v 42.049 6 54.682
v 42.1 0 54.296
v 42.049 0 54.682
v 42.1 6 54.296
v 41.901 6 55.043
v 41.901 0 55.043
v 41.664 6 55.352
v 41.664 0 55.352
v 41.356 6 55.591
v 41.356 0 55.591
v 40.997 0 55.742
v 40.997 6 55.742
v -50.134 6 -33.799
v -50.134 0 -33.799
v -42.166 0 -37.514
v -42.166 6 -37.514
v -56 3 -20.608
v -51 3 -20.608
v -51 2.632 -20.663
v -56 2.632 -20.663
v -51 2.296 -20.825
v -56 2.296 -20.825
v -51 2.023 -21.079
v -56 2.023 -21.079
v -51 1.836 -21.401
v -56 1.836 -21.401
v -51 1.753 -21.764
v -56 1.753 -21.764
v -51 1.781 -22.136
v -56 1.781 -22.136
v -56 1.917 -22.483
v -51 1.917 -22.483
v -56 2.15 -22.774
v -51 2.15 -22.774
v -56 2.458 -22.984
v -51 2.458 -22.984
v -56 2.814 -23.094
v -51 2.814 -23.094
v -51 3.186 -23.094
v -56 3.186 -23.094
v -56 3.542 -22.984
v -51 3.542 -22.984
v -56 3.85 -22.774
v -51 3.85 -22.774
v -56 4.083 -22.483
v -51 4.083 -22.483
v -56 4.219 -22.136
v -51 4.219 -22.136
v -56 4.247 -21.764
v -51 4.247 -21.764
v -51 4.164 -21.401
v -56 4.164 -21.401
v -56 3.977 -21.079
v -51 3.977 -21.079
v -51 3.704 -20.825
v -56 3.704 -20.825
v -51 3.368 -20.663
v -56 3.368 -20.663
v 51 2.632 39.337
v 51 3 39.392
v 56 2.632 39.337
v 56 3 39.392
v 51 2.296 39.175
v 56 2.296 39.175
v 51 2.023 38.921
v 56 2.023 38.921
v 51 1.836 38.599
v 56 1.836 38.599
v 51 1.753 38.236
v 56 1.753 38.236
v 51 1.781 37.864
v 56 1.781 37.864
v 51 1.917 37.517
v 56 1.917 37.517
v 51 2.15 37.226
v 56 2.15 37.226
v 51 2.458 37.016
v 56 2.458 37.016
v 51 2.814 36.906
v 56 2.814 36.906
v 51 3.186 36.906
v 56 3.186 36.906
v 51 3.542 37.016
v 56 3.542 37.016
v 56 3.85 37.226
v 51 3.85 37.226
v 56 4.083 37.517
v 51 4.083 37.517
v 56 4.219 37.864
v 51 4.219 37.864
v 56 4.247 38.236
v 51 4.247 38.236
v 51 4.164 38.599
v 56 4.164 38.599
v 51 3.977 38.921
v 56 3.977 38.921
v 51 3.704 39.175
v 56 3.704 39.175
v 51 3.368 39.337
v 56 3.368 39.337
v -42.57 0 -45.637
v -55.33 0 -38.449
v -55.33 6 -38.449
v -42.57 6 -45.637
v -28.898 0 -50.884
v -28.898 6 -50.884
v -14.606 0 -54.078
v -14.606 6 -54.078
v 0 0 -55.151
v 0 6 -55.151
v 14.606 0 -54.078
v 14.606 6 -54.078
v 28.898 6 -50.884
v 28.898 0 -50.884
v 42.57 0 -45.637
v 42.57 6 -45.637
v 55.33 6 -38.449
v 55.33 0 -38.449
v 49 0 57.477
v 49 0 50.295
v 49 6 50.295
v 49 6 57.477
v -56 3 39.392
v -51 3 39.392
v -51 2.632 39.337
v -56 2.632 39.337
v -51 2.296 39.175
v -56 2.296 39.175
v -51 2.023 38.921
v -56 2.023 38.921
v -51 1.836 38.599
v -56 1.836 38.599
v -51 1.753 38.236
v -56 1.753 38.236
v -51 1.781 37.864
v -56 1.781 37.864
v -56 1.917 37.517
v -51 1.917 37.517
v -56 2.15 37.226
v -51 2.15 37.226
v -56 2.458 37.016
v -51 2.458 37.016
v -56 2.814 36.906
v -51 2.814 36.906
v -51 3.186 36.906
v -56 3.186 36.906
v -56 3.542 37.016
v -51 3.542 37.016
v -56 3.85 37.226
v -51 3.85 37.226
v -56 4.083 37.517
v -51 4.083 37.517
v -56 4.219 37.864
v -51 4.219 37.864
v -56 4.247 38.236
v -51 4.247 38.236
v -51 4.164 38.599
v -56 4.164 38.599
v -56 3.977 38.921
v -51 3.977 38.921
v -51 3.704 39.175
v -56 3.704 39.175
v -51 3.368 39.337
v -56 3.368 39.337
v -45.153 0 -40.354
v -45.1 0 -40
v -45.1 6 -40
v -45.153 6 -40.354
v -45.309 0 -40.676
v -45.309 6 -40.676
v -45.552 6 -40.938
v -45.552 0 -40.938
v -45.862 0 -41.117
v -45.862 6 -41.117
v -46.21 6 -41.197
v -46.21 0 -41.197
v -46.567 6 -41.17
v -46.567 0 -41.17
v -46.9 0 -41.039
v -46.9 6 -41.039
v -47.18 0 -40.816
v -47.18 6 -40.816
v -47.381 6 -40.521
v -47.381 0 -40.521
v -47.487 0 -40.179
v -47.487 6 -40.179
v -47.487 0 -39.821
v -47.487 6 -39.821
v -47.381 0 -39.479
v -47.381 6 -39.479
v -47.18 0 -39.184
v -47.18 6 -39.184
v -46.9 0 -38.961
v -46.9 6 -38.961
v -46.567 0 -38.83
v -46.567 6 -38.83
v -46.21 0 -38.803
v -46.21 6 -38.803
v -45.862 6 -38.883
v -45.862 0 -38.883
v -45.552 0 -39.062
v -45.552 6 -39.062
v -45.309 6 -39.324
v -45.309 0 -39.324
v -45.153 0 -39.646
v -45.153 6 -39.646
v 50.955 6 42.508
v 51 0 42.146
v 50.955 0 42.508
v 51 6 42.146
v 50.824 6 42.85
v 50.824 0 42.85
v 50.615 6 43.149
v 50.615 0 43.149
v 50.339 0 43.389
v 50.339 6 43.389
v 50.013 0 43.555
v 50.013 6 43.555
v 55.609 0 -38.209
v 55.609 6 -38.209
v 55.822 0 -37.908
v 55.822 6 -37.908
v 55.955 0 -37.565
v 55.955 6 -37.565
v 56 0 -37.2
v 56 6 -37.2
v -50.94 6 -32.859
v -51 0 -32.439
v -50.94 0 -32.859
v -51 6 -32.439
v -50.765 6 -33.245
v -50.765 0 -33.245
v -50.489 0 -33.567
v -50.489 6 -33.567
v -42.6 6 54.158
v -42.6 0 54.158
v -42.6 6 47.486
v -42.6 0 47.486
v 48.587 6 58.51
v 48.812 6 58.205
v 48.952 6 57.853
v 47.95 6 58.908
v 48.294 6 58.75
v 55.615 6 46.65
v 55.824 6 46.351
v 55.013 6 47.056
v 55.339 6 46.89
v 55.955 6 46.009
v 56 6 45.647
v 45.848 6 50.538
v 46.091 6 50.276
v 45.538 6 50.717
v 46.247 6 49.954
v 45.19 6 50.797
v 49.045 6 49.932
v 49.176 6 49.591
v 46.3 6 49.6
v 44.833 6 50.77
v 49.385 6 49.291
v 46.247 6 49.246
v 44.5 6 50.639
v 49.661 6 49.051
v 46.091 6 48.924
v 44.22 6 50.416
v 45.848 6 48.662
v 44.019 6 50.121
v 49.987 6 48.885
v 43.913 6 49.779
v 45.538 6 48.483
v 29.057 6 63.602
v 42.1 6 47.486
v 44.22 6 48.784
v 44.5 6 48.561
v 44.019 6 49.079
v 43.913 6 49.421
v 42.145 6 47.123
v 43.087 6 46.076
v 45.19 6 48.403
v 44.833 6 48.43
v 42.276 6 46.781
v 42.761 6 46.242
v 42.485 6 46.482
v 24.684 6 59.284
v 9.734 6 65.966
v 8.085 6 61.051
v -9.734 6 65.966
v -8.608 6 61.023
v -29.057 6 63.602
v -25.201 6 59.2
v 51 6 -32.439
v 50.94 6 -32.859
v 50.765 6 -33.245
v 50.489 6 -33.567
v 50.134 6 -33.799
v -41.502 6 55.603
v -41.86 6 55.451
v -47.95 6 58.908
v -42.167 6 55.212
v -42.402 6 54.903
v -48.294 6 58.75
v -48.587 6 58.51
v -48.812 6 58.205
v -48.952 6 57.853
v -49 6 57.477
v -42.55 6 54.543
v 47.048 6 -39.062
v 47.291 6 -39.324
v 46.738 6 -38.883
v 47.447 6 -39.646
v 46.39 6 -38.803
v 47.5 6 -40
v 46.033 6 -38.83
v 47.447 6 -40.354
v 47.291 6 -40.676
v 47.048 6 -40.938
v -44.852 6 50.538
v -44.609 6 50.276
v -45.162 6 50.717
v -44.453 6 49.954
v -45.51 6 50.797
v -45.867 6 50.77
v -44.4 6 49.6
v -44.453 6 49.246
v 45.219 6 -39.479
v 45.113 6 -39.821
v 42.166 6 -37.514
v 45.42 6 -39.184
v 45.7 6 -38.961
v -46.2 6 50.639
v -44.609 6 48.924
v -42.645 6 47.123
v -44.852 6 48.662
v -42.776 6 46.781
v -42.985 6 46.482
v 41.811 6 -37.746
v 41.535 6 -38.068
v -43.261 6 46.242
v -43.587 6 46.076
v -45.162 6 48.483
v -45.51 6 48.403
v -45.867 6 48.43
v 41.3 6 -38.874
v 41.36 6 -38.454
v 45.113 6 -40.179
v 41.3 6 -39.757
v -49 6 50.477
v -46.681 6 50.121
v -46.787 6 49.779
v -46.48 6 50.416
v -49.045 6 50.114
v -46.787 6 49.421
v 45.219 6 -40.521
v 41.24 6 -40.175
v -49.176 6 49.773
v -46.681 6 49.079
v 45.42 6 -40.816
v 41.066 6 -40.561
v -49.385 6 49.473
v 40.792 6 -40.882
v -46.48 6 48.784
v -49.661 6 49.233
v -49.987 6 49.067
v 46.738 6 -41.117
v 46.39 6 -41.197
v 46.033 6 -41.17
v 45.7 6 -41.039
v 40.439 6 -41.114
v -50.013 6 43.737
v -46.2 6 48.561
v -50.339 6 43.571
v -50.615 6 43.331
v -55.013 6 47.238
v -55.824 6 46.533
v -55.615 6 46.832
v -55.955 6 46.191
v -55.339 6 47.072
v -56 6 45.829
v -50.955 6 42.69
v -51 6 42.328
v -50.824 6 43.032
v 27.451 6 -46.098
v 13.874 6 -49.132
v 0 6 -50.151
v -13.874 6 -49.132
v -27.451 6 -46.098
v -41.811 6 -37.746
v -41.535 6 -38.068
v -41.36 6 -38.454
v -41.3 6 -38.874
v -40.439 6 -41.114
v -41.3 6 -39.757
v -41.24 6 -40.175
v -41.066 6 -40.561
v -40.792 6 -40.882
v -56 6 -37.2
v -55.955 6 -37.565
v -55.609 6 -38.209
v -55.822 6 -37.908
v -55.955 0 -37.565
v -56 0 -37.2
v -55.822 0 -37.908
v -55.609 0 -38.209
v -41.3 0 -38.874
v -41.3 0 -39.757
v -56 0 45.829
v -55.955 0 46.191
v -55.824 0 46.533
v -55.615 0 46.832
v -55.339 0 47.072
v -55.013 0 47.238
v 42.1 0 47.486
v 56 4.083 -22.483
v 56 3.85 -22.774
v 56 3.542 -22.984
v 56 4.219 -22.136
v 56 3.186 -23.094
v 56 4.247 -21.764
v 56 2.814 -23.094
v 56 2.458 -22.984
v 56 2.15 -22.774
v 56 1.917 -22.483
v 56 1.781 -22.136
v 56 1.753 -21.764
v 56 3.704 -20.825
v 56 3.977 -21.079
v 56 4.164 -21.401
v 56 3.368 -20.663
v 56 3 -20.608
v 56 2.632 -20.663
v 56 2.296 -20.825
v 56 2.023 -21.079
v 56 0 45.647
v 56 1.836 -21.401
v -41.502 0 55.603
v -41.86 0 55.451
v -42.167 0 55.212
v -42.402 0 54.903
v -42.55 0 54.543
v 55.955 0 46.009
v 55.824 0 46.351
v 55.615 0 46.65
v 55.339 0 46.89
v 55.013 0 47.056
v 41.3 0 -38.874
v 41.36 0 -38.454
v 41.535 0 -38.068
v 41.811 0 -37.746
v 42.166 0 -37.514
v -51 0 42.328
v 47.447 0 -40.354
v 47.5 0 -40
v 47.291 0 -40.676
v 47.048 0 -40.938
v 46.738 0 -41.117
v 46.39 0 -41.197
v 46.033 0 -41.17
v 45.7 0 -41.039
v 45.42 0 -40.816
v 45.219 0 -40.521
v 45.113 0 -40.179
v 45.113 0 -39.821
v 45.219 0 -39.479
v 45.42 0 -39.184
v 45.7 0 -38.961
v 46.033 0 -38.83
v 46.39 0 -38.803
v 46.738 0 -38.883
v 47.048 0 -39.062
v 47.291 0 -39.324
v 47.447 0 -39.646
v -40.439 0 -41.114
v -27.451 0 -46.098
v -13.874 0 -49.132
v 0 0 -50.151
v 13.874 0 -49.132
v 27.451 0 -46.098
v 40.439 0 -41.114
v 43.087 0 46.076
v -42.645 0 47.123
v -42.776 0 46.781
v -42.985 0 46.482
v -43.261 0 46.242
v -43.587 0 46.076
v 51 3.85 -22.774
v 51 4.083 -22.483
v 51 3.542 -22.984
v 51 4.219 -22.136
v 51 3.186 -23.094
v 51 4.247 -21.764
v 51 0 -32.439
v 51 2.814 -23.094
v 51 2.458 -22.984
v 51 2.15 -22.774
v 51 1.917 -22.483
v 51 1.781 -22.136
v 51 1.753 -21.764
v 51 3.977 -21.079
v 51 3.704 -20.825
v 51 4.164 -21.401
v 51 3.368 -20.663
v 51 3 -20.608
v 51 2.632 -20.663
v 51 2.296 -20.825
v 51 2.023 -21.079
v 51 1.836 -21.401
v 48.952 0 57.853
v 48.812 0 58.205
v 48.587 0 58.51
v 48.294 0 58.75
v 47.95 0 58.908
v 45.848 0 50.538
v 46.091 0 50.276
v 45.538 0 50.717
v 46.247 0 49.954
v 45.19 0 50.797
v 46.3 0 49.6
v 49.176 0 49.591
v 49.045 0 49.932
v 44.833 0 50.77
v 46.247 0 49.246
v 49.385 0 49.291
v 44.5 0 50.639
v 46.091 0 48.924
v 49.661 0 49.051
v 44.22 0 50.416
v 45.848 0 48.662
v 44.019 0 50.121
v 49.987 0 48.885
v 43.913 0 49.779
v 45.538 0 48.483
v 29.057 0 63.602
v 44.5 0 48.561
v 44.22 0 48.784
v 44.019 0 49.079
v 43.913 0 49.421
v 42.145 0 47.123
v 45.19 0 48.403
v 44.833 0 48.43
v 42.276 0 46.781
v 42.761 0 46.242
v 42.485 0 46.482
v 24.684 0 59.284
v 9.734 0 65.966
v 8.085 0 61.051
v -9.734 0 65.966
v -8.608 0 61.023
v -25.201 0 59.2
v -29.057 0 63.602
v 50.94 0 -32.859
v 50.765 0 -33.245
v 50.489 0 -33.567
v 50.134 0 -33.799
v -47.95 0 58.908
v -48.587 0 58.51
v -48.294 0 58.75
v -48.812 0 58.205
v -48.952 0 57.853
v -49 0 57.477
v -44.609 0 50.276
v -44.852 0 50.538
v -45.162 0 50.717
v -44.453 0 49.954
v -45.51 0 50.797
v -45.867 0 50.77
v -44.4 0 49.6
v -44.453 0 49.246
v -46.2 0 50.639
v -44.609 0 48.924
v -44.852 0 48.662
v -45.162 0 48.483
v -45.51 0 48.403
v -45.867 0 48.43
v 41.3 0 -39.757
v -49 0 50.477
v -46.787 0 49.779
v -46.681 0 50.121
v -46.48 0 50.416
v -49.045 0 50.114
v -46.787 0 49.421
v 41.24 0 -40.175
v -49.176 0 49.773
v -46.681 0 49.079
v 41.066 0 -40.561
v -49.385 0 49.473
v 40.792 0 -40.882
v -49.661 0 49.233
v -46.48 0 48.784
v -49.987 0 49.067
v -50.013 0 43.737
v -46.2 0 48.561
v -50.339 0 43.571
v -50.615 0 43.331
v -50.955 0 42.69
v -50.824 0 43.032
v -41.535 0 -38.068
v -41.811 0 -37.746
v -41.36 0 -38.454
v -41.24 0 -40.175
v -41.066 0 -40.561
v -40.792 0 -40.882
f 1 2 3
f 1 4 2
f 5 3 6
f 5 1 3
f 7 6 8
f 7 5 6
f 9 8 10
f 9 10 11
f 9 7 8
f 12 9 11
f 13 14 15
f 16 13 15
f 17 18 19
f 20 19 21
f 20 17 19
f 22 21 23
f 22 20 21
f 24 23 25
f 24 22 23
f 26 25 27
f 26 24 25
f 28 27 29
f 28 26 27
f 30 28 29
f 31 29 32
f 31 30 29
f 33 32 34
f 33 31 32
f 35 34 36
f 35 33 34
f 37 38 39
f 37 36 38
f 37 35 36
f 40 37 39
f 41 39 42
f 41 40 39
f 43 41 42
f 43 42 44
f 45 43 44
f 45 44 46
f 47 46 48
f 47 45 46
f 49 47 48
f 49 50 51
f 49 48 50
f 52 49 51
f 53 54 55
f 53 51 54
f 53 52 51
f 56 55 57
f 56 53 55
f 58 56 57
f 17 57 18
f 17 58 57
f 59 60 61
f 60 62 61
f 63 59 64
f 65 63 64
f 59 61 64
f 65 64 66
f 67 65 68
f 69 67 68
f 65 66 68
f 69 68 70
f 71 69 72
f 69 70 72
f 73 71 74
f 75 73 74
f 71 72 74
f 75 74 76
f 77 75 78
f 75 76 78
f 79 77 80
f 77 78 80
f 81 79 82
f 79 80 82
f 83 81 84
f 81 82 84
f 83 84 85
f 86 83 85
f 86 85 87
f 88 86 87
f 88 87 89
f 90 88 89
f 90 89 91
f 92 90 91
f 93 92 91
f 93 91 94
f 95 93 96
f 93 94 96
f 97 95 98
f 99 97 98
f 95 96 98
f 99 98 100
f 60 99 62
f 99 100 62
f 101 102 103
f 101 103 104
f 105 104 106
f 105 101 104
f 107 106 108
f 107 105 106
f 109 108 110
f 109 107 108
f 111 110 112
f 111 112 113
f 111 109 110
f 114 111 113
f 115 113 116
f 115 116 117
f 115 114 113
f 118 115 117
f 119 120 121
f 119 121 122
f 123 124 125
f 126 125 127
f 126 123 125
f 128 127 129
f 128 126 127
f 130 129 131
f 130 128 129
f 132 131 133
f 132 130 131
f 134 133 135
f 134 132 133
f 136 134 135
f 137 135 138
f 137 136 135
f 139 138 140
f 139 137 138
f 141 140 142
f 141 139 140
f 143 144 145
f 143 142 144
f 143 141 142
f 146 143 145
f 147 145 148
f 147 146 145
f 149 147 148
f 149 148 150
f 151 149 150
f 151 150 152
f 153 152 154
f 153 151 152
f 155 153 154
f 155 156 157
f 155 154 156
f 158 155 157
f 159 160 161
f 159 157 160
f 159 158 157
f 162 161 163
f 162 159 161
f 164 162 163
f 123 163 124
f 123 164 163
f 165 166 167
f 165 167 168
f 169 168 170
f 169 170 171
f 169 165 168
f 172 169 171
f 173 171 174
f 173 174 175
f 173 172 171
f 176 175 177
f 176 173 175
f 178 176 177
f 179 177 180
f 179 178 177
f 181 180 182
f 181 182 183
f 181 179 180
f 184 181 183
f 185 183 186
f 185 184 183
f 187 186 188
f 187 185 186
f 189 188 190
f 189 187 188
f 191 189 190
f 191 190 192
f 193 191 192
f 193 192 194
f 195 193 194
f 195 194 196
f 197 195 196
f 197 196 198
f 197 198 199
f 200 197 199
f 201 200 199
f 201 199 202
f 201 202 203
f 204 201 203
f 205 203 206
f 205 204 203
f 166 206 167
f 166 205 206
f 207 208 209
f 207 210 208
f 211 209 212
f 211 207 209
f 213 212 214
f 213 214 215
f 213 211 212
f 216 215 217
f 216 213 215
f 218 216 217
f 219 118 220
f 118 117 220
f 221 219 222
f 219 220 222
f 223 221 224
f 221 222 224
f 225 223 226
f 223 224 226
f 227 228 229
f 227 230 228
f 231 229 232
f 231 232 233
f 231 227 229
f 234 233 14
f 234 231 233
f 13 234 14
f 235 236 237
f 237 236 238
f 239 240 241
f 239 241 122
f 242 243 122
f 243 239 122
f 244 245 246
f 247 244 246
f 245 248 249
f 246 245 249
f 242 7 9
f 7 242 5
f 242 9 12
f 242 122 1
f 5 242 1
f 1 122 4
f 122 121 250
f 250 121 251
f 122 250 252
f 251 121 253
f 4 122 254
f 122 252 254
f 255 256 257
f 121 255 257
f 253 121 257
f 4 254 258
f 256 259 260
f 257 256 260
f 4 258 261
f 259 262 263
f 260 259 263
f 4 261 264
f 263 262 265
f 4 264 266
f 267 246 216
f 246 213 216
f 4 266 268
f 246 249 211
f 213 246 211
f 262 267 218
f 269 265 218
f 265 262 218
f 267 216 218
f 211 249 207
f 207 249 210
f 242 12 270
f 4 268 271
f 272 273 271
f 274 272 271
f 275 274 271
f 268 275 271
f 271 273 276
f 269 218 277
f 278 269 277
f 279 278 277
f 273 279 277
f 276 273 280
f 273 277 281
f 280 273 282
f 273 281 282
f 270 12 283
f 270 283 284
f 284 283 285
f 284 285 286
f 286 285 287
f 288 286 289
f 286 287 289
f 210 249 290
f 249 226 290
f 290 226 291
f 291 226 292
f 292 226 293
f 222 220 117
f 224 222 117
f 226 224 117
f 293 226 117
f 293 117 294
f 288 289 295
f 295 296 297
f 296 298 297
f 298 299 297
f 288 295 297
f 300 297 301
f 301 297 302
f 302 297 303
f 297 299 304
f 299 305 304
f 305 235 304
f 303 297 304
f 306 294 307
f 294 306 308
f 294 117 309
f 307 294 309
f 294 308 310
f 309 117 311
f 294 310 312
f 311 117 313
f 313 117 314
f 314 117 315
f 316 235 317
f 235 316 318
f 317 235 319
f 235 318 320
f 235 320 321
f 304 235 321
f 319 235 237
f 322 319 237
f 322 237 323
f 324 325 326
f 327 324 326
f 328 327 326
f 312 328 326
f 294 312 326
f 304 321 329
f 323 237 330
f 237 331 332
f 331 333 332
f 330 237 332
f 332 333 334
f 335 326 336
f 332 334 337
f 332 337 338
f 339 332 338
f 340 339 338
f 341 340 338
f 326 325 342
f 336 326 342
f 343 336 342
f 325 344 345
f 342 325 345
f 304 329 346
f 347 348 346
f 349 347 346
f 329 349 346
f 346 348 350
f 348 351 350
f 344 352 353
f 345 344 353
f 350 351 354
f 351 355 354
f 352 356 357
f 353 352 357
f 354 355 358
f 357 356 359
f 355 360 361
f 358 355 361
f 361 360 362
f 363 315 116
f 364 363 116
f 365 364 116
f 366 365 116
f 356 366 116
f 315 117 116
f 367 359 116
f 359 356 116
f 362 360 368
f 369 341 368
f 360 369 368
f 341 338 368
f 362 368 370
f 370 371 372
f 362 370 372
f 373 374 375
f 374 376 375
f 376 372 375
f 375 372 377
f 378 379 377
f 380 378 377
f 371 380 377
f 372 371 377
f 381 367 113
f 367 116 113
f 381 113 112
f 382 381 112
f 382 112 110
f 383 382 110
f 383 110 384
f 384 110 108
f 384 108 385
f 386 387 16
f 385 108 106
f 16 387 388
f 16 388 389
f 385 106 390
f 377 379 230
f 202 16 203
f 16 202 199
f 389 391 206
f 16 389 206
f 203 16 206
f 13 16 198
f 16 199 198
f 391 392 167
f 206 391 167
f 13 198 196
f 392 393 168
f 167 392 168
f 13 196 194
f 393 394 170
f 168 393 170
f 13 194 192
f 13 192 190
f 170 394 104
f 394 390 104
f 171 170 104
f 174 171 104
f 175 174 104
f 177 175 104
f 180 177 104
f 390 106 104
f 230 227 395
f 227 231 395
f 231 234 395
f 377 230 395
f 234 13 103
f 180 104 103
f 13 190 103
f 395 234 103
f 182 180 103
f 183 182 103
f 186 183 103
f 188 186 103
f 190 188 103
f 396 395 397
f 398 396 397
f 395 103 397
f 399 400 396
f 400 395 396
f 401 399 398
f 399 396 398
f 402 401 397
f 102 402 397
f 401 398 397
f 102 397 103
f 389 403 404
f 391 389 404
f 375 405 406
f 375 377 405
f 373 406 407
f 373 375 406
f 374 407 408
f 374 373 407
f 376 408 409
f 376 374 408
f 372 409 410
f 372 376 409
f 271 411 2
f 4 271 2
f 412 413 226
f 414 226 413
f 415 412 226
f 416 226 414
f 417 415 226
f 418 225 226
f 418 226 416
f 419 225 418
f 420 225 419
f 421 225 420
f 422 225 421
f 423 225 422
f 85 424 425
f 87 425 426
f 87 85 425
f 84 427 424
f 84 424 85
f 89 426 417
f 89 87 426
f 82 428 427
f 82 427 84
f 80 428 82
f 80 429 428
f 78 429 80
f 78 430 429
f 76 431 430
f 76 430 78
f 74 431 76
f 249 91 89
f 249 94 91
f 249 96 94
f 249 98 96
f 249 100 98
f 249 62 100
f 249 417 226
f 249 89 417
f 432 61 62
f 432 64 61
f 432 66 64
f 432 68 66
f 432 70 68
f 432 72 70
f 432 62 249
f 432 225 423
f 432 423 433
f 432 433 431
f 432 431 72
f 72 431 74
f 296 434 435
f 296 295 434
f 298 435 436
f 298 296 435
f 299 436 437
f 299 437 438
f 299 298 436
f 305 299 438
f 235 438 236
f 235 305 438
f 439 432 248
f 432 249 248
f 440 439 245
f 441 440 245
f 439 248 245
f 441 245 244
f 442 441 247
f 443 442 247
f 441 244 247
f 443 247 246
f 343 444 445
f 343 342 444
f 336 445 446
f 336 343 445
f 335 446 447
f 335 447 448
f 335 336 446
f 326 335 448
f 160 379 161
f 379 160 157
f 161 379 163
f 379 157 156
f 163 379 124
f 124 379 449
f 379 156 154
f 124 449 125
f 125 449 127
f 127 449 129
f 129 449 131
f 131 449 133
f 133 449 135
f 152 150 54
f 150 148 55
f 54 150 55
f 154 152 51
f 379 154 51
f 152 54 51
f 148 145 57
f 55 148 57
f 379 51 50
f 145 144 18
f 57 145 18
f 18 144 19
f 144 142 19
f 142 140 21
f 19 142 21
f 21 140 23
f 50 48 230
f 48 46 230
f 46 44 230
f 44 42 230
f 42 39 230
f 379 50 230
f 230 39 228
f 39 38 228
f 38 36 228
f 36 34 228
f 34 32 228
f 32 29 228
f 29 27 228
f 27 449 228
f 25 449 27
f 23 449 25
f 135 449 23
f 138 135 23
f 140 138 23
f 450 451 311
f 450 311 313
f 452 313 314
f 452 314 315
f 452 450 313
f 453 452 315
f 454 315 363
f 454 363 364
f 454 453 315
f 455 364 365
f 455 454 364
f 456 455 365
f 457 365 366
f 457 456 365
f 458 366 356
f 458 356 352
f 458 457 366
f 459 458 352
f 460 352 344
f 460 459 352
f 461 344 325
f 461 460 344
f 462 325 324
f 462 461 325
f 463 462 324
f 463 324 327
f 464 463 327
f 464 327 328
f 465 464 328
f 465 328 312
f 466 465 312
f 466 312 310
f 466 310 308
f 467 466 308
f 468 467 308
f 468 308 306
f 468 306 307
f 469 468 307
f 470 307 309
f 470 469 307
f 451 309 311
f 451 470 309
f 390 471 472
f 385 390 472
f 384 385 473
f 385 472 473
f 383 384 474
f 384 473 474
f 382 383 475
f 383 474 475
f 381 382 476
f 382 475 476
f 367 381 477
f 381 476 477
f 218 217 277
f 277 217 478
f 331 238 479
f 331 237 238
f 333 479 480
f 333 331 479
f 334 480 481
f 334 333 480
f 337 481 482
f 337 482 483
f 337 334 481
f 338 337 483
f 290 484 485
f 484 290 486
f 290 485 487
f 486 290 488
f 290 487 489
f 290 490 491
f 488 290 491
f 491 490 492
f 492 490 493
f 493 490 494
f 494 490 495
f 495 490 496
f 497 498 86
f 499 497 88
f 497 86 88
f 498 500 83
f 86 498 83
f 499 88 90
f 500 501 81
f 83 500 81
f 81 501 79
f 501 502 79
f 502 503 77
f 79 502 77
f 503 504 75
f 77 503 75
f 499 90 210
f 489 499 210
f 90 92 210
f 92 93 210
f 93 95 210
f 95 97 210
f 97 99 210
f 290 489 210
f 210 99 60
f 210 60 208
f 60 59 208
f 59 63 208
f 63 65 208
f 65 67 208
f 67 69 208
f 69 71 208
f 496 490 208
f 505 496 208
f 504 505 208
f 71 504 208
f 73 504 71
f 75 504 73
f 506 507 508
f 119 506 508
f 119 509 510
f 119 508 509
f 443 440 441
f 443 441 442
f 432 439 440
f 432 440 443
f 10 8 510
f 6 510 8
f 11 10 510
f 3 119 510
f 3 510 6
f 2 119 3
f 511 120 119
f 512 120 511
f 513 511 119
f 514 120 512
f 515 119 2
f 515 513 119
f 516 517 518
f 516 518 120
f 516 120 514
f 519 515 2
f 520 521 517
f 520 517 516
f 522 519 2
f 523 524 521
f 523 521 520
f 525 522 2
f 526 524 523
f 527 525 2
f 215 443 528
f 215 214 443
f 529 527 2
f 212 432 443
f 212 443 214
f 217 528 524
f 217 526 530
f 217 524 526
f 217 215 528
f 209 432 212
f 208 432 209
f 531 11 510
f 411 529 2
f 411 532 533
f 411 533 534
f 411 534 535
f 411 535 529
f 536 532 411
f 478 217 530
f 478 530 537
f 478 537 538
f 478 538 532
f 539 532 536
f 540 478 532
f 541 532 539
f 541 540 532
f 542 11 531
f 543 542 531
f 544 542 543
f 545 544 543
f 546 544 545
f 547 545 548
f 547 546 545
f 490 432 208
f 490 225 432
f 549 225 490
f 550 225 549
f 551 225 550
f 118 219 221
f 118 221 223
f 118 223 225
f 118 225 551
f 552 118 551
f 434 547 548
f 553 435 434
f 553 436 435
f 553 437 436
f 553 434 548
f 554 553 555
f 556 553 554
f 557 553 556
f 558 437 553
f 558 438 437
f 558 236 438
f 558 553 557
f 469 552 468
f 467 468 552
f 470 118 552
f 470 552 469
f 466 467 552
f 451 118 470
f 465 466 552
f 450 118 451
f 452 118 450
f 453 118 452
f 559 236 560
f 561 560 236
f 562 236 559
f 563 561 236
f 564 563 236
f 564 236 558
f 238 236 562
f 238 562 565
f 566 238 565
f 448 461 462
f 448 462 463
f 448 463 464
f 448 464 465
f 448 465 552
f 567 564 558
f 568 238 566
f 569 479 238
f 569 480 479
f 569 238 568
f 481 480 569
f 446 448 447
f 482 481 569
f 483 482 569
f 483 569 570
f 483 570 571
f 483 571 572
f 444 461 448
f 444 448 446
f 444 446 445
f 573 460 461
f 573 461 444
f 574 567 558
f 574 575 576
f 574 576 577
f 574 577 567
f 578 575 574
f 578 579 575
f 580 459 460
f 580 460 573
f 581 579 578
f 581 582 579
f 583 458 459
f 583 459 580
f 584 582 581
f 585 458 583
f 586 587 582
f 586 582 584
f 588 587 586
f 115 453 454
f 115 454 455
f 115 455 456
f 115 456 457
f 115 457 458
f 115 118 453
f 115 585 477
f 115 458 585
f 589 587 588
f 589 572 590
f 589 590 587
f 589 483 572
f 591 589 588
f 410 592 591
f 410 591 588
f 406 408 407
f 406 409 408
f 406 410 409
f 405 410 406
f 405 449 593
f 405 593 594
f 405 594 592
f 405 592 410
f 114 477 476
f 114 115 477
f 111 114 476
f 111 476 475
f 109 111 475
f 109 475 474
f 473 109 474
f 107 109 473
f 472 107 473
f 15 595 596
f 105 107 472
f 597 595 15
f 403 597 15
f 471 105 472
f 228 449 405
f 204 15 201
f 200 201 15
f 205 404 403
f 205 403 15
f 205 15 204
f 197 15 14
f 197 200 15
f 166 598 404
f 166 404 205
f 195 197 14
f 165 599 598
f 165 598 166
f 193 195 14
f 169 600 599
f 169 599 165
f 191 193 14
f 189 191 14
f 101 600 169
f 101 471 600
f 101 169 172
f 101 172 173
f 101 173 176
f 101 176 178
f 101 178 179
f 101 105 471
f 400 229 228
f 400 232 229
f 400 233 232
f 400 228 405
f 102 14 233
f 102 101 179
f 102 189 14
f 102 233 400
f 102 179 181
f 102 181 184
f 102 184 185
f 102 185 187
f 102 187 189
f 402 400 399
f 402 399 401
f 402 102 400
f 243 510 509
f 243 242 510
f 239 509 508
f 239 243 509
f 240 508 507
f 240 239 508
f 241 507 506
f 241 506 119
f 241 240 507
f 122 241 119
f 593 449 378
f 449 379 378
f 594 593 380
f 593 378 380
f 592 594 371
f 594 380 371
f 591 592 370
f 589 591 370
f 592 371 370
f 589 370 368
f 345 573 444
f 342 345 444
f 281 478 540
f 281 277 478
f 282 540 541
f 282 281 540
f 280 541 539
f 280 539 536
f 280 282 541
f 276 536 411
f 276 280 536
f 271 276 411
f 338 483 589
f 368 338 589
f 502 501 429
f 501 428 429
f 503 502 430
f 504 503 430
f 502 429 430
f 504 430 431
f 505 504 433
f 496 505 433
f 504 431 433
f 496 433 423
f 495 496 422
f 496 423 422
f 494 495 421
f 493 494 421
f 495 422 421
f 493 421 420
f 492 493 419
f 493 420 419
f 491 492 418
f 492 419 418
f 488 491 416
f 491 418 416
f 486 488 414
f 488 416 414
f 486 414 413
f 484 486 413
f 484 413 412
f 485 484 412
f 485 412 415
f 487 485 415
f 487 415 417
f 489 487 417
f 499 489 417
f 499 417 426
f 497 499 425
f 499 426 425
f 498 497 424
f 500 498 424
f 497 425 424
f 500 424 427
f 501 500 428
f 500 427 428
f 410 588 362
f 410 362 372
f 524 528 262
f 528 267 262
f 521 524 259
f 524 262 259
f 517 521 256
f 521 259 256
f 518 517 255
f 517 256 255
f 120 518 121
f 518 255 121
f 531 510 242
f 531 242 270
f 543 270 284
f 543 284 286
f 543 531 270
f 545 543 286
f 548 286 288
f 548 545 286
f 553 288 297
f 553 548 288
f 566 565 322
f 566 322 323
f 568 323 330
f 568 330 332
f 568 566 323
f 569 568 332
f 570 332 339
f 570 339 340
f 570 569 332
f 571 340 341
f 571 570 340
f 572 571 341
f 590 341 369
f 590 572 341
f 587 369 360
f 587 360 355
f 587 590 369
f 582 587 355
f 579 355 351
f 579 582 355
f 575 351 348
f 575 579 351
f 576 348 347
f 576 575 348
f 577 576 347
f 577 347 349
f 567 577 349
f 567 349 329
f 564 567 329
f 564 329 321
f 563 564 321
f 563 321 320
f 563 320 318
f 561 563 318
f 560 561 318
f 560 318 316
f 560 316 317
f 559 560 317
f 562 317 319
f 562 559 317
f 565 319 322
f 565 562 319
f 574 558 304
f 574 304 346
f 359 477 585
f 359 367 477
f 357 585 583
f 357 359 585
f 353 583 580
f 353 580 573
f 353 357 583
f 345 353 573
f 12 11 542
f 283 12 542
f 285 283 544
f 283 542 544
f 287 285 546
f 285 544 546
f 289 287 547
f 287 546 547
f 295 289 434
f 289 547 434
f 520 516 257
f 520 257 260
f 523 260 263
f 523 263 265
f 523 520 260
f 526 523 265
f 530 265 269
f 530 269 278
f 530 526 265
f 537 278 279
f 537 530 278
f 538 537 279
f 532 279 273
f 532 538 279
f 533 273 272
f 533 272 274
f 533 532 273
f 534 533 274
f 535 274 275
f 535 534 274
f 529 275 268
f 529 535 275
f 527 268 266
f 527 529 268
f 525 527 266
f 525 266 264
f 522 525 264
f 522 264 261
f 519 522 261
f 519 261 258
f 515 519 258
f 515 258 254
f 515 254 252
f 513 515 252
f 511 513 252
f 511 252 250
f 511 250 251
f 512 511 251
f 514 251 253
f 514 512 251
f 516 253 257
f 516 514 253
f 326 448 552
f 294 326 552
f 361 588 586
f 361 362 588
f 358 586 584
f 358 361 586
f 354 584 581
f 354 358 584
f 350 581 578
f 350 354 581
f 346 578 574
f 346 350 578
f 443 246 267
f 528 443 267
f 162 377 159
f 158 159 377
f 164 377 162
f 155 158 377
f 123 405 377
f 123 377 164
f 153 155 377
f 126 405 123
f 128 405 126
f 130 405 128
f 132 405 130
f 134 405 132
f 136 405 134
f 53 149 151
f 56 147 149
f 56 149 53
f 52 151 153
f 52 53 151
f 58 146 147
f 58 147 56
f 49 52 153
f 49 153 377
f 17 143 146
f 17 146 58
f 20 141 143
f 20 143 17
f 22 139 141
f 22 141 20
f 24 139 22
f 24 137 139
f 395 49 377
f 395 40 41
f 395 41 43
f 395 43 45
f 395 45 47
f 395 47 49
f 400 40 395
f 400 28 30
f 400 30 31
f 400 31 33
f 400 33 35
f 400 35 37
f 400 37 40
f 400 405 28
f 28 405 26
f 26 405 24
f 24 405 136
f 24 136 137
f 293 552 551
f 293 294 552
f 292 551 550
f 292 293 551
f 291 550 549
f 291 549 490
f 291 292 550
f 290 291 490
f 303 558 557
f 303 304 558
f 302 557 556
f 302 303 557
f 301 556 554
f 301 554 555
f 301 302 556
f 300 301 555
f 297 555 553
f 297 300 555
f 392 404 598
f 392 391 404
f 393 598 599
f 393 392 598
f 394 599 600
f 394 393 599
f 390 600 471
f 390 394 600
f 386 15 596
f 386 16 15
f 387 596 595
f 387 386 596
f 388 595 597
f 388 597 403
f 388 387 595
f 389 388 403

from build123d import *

# Parameters (mm, degrees)
SKETCH1_R                        = 1.2
BOSS_EXTRUDE1_DEPTH              = 6
TAP_DRILL_FOR_M3_TAP1_AT_2_COUNT = 2
TAP_DRILL_FOR_M3_TAP1_AT_2_PITCH = 60
FILLET1_R                        = 1.5


with BuildPart() as part:
    # Sketch1 → Boss-Extrude1 (new body)
    with BuildSketch(Plane(origin=(0, 0, 0), x_dir=(1, 0, 0), z_dir=(0, 1, 0))):
        with BuildLine():
            Line((-56, -46.878887336), (-56, 38))
            ThreePointArc((-56, 38), (0, 55.150739291), (56, 38))
            Line((56, 38), (56, -46.696902219))
            Line((56, -46.696902219), (49, -49.244693859))
            Line((49, -49.244693859), (49, -58.574358685))
            ThreePointArc((49, -58.574358685), (0, -66.262179264), (-49, -58.574358685))
            Line((-49, -58.574358685), (-49, -49.426678976))
            Line((-49, -49.426678976), (-56, -46.878887336))
        make_face()
        with Locations((-46.3, 40)):
            Circle(SKETCH1_R, mode=Mode.SUBTRACT)
        with Locations((46.3, 40)):
            Circle(SKETCH1_R, mode=Mode.SUBTRACT)
        with Locations((45.1, -49.6)):
            Circle(SKETCH1_R, mode=Mode.SUBTRACT)
        with Locations((-45.6, -49.6)):
            Circle(SKETCH1_R, mode=Mode.SUBTRACT)
        with BuildLine():
            Line((-51, -43.377849645), (-51, 33.394842331))
            Line((-51, 33.394842331), (-41.3, 37.918026615))
            Line((-41.3, 37.918026615), (-41.3, 40.703705341))
            ThreePointArc((-41.3, 40.703705341), (0, 50.150739291), (41.3, 40.703705341))
            Line((41.3, 40.703705341), (41.3, 37.918026615))
            Line((41.3, 37.918026615), (51, 33.394842331))
            Line((51, 33.394842331), (51, -43.195864528))
            Line((51, -43.195864528), (42.1, -46.435199613))
            Line((42.1, -46.435199613), (42.1, -55.435199613))
            ThreePointArc((42.1, -55.435199613), (-0.259888817, -61.261961386), (-42.6, -55.29318275))
            Line((-42.6, -55.29318275), (-42.6, -46.435199613))
            Line((-42.6, -46.435199613), (-51, -43.377849645))
        make_face(mode=Mode.SUBTRACT)
    extrude(amount=BOSS_EXTRUDE1_DEPTH)

    # Sketch2 → Tap Drill for M3 Tap1 (revolve, cut)
    with BuildSketch(Plane(origin=(-56, 3, -21.857868774), x_dir=(0, 0, 1), z_dir=(0, 1, 0))):
        Polygon((0, 0), (0, 10.751075774), (1.25, 10), (1.25, 0), align=None)
    tap_drill_for_m3_tap1 = revolve(axis=Axis((-62.35, 3, -21.857868774), (1, 0, 0)), mode=Mode.SUBTRACT)

    # Tap Drill for M3 Tap1 at 2: Tap Drill for M3 Tap1 ×2
    with Locations(*[(0, 0, i * TAP_DRILL_FOR_M3_TAP1_AT_2_PITCH) for i in range(1, TAP_DRILL_FOR_M3_TAP1_AT_2_COUNT)]):
        add(tap_drill_for_m3_tap1, mode=Mode.SUBTRACT)

    # Mirror1: Tap Drill for M3 Tap1 across plane
    add(tap_drill_for_m3_tap1.mirror(Plane(origin=(0, 0, 0), x_dir=(0, 0, 1), z_dir=(1, 0, 0))), mode=Mode.SUBTRACT)

    # Mirror1 copy 1 sketch → Mirror1 copy 1 (revolve, cut)
    with BuildSketch(Plane(origin=(56, 3, 38.142131226), x_dir=(0, 0, 1), z_dir=(0, 1, 0))):
        Polygon((0, 0), (0, -10.751075774), (1.25, -10), (1.25, 0), align=None)
    revolve(axis=Axis((62.35, 3, 38.142131226), (1, 0, 0)), mode=Mode.SUBTRACT)

    # Fillet1
    fillet1_edges = [part.edges().sort_by_distance(p)[0] for p in [
        (49, 3, 49.244693859),
        (49, 3, 58.574358685),
        (-49, 3, 58.574358685),
        (-49, 3, 49.426678976),
        (-56, 3, 46.878887336),
        (-56, 3, -38),
        (56, 3, -38),
        (56, 3, 46.696902219),
        (-51, 3, 43.377849645),
        (-42.6, 3, 46.435199613),
        (-42.6, 3, 55.29318275),
        (42.1, 3, 55.435199613),
        (42.1, 3, 46.435199613),
        (51, 3, 43.195864528),
        (51, 3, -33.394842331),
        (41.3, 3, -37.918026615),
        (41.3, 3, -40.703705341),
        (-41.3, 3, -40.703705341),
        (-41.3, 3, -37.918026615),
        (-51, 3, -33.394842331),
    ]]
    fillet(fillet1_edges, radius=FILLET1_R)


solid = part.part
